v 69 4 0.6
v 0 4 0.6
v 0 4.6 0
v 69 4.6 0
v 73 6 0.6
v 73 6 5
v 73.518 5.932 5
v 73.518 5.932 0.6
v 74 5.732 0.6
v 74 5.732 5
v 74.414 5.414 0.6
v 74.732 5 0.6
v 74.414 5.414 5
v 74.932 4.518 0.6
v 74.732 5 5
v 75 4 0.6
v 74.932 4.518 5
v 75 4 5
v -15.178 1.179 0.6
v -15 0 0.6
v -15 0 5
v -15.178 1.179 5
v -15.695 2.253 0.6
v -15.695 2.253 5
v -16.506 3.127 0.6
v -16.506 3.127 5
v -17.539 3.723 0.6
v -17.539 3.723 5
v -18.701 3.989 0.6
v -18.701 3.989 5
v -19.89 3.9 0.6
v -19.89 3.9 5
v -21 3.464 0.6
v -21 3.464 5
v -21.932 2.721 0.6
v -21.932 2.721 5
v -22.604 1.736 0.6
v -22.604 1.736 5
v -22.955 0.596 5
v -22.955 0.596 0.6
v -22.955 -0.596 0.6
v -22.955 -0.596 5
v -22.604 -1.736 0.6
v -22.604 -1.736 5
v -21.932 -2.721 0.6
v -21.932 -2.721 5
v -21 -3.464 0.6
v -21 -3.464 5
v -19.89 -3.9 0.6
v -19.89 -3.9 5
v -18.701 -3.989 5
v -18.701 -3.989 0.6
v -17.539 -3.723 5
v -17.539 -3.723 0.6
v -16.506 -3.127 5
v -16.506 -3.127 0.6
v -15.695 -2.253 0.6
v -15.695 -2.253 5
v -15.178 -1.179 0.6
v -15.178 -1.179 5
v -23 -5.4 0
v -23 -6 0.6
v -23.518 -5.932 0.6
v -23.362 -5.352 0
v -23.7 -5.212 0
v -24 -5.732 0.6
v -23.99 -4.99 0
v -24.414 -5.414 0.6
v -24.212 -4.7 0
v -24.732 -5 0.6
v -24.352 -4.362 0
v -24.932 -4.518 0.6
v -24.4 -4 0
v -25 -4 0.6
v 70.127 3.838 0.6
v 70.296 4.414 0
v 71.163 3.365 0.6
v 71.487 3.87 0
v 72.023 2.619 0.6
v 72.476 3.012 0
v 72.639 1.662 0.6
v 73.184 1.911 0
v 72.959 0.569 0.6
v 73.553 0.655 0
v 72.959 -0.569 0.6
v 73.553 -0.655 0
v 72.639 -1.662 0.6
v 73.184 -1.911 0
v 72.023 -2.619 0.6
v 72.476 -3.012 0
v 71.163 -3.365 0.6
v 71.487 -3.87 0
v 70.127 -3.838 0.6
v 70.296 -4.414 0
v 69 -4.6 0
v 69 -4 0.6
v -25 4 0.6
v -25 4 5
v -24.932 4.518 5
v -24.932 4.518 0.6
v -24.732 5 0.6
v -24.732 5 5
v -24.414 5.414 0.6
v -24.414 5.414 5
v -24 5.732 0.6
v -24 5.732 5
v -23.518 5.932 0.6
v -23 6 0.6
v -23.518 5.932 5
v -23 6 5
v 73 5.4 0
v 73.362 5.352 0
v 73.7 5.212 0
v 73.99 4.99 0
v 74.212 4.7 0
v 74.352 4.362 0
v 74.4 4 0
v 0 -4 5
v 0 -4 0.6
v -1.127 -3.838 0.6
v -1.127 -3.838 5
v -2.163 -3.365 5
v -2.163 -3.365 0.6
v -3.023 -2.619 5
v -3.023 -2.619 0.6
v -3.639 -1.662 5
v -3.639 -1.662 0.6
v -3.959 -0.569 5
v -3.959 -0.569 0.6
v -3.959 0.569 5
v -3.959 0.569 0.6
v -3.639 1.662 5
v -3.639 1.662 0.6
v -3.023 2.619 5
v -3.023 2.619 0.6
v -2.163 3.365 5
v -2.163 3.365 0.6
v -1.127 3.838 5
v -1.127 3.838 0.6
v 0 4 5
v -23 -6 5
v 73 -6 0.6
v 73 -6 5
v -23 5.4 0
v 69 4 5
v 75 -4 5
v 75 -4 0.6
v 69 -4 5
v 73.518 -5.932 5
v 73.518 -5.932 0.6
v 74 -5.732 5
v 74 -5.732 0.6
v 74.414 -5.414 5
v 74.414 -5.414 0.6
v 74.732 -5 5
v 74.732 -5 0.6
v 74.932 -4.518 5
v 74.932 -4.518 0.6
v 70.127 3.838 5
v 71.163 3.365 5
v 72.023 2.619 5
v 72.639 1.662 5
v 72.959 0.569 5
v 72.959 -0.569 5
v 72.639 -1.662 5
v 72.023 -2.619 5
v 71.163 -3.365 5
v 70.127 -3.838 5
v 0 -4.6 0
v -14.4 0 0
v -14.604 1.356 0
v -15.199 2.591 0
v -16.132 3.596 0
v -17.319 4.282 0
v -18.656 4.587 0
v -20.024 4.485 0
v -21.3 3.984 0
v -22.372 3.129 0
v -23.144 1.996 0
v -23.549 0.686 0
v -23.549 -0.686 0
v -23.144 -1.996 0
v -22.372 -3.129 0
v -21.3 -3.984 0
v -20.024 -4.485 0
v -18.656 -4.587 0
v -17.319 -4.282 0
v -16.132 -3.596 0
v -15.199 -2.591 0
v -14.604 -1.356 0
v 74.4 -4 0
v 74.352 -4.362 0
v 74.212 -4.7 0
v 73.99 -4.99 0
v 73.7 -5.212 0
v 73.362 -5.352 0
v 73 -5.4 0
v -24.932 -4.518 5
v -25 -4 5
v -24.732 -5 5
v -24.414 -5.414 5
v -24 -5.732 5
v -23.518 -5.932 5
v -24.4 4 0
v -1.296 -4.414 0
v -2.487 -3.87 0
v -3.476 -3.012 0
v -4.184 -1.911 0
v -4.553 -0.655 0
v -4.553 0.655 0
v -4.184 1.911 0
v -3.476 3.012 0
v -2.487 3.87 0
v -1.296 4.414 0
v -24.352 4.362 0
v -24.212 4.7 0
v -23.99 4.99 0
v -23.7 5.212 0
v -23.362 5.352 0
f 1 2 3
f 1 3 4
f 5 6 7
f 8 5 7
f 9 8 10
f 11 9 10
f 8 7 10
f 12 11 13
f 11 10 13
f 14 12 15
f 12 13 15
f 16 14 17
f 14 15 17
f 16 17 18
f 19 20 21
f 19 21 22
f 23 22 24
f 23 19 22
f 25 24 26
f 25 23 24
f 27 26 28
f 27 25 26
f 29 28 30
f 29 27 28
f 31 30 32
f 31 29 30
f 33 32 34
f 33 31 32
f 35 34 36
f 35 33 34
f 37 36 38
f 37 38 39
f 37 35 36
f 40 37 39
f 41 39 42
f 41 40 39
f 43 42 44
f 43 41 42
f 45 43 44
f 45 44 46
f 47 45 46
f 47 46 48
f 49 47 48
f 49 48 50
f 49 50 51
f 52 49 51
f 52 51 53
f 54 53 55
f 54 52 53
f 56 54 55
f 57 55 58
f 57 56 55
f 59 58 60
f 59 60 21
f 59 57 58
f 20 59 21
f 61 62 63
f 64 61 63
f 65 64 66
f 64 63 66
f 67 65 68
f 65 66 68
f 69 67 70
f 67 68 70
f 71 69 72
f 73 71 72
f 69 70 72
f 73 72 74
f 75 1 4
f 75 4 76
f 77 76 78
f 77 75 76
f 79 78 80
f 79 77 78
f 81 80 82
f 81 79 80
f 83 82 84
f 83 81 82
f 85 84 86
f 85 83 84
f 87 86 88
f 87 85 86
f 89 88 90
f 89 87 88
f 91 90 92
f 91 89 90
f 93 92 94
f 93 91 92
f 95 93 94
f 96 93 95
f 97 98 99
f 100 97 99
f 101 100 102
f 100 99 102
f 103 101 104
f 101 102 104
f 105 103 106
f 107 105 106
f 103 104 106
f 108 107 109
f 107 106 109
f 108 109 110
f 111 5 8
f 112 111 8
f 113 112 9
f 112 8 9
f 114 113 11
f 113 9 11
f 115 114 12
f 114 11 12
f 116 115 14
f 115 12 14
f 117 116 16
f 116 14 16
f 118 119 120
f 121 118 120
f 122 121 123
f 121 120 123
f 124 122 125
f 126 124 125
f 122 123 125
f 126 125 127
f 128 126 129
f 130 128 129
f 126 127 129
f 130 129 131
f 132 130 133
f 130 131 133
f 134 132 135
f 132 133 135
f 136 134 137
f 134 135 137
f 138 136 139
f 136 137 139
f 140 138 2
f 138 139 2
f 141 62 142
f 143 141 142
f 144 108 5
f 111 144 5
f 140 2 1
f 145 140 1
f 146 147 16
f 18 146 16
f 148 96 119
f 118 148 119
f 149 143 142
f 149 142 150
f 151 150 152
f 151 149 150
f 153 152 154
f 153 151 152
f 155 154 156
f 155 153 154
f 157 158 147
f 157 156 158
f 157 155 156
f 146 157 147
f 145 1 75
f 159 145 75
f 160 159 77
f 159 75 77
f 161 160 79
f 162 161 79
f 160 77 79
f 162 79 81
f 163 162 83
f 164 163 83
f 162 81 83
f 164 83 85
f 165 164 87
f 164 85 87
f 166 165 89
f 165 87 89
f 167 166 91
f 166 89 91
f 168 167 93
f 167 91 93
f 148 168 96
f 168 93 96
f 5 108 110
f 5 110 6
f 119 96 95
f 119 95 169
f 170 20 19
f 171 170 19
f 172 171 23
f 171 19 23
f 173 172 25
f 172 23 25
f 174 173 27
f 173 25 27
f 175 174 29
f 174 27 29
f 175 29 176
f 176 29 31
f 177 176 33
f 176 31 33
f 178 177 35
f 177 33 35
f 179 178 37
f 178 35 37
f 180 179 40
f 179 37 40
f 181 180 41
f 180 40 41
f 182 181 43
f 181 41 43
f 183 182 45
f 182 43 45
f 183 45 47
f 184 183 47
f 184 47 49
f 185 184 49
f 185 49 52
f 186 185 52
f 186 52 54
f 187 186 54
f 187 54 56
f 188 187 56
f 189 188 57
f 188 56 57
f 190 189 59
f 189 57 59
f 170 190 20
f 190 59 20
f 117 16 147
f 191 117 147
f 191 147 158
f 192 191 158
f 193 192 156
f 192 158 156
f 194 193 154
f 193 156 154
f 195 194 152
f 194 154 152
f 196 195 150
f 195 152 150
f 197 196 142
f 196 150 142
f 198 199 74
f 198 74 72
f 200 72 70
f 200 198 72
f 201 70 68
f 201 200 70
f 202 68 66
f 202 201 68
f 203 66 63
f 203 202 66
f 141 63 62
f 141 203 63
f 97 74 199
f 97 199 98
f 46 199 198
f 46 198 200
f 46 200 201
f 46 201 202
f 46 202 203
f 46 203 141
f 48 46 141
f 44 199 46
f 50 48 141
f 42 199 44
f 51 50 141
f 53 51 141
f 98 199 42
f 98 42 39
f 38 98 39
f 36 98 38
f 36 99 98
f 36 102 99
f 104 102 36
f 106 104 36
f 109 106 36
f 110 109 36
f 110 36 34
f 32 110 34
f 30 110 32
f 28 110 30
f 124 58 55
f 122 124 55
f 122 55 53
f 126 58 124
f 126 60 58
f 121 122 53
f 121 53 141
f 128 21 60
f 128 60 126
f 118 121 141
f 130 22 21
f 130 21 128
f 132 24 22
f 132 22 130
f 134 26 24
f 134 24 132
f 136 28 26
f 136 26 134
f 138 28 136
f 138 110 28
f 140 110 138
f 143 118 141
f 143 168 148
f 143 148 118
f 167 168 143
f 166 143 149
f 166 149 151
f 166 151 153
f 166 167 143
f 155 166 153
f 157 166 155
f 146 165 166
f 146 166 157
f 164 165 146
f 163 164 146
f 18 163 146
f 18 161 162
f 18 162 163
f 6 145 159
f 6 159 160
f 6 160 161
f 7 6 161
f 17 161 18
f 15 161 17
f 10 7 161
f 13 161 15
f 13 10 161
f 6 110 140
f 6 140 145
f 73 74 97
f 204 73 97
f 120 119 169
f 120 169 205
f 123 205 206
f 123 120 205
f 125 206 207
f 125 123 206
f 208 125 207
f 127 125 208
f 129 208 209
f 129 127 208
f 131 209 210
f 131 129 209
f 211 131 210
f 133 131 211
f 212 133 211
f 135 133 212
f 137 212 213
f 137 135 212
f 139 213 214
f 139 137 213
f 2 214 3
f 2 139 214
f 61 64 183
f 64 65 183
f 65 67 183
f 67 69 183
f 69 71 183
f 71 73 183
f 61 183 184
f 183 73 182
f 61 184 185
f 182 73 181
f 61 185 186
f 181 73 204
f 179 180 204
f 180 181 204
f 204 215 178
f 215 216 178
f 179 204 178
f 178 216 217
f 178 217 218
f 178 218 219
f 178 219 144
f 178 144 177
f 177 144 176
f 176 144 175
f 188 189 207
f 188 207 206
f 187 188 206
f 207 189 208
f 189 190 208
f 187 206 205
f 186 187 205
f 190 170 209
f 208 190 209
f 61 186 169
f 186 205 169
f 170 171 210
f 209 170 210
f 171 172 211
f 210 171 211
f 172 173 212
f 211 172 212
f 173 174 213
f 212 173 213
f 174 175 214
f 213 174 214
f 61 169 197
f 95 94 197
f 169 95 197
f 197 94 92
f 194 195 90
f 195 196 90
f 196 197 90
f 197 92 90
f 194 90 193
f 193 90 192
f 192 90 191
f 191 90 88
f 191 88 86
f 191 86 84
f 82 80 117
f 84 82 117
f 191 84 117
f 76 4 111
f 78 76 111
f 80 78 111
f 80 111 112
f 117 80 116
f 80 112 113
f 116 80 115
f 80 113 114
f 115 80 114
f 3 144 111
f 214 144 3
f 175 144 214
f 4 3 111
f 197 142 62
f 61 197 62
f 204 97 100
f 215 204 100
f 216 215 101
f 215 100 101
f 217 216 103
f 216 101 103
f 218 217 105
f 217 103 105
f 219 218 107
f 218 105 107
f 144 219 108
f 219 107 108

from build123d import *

# Parameters (mm, degrees)
F0_W     = 100
F0_H     = 12
F0_R     = 4
F1_DEPTH = 5
F2_R     = 2
F3_SIZE  = 0.6


with BuildPart() as f1:
    # F0 (on Top) → F1 (new body)
    with BuildSketch(Plane.XY):
        with Locations((25, 0)):
            Rectangle(F0_W, F0_H)
        with Locations((-19, 0)):
            Circle(F0_R, mode=Mode.SUBTRACT)
        with BuildLine():
            Line((69, -4), (0, -4))
            ThreePointArc((0, -4), (-4, 0), (0, 4))
            Line((0, 4), (69, 4))
            ThreePointArc((69, 4), (73, 0), (69, -4))
        make_face(mode=Mode.SUBTRACT)
    extrude(amount=F1_DEPTH)

    # F2
    f2_edges = [f1.edges().sort_by_distance(p)[0] for p in [
        (-25, -6, 2.5),
        (-25, 6, 2.5),
        (75, 6, 2.5),
        (75, -6, 2.5),
    ]]
    fillet(f2_edges, radius=F2_R)

    # F3
    f3_edges = [f1.edges().sort_by_distance(p)[0] for p in [
        (25, 6, 0),
        (74.414214, 5.414214, 0),
        (-24.414214, 5.414214, 0),
        (75, 0, 0),
        (-25, 0, 0),
        (74.414214, -5.414214, 0),
        (-24.414214, -5.414214, 0),
        (25, -6, 0),
        (-23, 0, 0),
        (34.5, 4, 0),
        (73, 0, 0),
        (34.5, -4, 0),
        (-4, 0, 0),
    ]]
    chamfer(f3_edges, length=F3_SIZE)


solid = f1.part
